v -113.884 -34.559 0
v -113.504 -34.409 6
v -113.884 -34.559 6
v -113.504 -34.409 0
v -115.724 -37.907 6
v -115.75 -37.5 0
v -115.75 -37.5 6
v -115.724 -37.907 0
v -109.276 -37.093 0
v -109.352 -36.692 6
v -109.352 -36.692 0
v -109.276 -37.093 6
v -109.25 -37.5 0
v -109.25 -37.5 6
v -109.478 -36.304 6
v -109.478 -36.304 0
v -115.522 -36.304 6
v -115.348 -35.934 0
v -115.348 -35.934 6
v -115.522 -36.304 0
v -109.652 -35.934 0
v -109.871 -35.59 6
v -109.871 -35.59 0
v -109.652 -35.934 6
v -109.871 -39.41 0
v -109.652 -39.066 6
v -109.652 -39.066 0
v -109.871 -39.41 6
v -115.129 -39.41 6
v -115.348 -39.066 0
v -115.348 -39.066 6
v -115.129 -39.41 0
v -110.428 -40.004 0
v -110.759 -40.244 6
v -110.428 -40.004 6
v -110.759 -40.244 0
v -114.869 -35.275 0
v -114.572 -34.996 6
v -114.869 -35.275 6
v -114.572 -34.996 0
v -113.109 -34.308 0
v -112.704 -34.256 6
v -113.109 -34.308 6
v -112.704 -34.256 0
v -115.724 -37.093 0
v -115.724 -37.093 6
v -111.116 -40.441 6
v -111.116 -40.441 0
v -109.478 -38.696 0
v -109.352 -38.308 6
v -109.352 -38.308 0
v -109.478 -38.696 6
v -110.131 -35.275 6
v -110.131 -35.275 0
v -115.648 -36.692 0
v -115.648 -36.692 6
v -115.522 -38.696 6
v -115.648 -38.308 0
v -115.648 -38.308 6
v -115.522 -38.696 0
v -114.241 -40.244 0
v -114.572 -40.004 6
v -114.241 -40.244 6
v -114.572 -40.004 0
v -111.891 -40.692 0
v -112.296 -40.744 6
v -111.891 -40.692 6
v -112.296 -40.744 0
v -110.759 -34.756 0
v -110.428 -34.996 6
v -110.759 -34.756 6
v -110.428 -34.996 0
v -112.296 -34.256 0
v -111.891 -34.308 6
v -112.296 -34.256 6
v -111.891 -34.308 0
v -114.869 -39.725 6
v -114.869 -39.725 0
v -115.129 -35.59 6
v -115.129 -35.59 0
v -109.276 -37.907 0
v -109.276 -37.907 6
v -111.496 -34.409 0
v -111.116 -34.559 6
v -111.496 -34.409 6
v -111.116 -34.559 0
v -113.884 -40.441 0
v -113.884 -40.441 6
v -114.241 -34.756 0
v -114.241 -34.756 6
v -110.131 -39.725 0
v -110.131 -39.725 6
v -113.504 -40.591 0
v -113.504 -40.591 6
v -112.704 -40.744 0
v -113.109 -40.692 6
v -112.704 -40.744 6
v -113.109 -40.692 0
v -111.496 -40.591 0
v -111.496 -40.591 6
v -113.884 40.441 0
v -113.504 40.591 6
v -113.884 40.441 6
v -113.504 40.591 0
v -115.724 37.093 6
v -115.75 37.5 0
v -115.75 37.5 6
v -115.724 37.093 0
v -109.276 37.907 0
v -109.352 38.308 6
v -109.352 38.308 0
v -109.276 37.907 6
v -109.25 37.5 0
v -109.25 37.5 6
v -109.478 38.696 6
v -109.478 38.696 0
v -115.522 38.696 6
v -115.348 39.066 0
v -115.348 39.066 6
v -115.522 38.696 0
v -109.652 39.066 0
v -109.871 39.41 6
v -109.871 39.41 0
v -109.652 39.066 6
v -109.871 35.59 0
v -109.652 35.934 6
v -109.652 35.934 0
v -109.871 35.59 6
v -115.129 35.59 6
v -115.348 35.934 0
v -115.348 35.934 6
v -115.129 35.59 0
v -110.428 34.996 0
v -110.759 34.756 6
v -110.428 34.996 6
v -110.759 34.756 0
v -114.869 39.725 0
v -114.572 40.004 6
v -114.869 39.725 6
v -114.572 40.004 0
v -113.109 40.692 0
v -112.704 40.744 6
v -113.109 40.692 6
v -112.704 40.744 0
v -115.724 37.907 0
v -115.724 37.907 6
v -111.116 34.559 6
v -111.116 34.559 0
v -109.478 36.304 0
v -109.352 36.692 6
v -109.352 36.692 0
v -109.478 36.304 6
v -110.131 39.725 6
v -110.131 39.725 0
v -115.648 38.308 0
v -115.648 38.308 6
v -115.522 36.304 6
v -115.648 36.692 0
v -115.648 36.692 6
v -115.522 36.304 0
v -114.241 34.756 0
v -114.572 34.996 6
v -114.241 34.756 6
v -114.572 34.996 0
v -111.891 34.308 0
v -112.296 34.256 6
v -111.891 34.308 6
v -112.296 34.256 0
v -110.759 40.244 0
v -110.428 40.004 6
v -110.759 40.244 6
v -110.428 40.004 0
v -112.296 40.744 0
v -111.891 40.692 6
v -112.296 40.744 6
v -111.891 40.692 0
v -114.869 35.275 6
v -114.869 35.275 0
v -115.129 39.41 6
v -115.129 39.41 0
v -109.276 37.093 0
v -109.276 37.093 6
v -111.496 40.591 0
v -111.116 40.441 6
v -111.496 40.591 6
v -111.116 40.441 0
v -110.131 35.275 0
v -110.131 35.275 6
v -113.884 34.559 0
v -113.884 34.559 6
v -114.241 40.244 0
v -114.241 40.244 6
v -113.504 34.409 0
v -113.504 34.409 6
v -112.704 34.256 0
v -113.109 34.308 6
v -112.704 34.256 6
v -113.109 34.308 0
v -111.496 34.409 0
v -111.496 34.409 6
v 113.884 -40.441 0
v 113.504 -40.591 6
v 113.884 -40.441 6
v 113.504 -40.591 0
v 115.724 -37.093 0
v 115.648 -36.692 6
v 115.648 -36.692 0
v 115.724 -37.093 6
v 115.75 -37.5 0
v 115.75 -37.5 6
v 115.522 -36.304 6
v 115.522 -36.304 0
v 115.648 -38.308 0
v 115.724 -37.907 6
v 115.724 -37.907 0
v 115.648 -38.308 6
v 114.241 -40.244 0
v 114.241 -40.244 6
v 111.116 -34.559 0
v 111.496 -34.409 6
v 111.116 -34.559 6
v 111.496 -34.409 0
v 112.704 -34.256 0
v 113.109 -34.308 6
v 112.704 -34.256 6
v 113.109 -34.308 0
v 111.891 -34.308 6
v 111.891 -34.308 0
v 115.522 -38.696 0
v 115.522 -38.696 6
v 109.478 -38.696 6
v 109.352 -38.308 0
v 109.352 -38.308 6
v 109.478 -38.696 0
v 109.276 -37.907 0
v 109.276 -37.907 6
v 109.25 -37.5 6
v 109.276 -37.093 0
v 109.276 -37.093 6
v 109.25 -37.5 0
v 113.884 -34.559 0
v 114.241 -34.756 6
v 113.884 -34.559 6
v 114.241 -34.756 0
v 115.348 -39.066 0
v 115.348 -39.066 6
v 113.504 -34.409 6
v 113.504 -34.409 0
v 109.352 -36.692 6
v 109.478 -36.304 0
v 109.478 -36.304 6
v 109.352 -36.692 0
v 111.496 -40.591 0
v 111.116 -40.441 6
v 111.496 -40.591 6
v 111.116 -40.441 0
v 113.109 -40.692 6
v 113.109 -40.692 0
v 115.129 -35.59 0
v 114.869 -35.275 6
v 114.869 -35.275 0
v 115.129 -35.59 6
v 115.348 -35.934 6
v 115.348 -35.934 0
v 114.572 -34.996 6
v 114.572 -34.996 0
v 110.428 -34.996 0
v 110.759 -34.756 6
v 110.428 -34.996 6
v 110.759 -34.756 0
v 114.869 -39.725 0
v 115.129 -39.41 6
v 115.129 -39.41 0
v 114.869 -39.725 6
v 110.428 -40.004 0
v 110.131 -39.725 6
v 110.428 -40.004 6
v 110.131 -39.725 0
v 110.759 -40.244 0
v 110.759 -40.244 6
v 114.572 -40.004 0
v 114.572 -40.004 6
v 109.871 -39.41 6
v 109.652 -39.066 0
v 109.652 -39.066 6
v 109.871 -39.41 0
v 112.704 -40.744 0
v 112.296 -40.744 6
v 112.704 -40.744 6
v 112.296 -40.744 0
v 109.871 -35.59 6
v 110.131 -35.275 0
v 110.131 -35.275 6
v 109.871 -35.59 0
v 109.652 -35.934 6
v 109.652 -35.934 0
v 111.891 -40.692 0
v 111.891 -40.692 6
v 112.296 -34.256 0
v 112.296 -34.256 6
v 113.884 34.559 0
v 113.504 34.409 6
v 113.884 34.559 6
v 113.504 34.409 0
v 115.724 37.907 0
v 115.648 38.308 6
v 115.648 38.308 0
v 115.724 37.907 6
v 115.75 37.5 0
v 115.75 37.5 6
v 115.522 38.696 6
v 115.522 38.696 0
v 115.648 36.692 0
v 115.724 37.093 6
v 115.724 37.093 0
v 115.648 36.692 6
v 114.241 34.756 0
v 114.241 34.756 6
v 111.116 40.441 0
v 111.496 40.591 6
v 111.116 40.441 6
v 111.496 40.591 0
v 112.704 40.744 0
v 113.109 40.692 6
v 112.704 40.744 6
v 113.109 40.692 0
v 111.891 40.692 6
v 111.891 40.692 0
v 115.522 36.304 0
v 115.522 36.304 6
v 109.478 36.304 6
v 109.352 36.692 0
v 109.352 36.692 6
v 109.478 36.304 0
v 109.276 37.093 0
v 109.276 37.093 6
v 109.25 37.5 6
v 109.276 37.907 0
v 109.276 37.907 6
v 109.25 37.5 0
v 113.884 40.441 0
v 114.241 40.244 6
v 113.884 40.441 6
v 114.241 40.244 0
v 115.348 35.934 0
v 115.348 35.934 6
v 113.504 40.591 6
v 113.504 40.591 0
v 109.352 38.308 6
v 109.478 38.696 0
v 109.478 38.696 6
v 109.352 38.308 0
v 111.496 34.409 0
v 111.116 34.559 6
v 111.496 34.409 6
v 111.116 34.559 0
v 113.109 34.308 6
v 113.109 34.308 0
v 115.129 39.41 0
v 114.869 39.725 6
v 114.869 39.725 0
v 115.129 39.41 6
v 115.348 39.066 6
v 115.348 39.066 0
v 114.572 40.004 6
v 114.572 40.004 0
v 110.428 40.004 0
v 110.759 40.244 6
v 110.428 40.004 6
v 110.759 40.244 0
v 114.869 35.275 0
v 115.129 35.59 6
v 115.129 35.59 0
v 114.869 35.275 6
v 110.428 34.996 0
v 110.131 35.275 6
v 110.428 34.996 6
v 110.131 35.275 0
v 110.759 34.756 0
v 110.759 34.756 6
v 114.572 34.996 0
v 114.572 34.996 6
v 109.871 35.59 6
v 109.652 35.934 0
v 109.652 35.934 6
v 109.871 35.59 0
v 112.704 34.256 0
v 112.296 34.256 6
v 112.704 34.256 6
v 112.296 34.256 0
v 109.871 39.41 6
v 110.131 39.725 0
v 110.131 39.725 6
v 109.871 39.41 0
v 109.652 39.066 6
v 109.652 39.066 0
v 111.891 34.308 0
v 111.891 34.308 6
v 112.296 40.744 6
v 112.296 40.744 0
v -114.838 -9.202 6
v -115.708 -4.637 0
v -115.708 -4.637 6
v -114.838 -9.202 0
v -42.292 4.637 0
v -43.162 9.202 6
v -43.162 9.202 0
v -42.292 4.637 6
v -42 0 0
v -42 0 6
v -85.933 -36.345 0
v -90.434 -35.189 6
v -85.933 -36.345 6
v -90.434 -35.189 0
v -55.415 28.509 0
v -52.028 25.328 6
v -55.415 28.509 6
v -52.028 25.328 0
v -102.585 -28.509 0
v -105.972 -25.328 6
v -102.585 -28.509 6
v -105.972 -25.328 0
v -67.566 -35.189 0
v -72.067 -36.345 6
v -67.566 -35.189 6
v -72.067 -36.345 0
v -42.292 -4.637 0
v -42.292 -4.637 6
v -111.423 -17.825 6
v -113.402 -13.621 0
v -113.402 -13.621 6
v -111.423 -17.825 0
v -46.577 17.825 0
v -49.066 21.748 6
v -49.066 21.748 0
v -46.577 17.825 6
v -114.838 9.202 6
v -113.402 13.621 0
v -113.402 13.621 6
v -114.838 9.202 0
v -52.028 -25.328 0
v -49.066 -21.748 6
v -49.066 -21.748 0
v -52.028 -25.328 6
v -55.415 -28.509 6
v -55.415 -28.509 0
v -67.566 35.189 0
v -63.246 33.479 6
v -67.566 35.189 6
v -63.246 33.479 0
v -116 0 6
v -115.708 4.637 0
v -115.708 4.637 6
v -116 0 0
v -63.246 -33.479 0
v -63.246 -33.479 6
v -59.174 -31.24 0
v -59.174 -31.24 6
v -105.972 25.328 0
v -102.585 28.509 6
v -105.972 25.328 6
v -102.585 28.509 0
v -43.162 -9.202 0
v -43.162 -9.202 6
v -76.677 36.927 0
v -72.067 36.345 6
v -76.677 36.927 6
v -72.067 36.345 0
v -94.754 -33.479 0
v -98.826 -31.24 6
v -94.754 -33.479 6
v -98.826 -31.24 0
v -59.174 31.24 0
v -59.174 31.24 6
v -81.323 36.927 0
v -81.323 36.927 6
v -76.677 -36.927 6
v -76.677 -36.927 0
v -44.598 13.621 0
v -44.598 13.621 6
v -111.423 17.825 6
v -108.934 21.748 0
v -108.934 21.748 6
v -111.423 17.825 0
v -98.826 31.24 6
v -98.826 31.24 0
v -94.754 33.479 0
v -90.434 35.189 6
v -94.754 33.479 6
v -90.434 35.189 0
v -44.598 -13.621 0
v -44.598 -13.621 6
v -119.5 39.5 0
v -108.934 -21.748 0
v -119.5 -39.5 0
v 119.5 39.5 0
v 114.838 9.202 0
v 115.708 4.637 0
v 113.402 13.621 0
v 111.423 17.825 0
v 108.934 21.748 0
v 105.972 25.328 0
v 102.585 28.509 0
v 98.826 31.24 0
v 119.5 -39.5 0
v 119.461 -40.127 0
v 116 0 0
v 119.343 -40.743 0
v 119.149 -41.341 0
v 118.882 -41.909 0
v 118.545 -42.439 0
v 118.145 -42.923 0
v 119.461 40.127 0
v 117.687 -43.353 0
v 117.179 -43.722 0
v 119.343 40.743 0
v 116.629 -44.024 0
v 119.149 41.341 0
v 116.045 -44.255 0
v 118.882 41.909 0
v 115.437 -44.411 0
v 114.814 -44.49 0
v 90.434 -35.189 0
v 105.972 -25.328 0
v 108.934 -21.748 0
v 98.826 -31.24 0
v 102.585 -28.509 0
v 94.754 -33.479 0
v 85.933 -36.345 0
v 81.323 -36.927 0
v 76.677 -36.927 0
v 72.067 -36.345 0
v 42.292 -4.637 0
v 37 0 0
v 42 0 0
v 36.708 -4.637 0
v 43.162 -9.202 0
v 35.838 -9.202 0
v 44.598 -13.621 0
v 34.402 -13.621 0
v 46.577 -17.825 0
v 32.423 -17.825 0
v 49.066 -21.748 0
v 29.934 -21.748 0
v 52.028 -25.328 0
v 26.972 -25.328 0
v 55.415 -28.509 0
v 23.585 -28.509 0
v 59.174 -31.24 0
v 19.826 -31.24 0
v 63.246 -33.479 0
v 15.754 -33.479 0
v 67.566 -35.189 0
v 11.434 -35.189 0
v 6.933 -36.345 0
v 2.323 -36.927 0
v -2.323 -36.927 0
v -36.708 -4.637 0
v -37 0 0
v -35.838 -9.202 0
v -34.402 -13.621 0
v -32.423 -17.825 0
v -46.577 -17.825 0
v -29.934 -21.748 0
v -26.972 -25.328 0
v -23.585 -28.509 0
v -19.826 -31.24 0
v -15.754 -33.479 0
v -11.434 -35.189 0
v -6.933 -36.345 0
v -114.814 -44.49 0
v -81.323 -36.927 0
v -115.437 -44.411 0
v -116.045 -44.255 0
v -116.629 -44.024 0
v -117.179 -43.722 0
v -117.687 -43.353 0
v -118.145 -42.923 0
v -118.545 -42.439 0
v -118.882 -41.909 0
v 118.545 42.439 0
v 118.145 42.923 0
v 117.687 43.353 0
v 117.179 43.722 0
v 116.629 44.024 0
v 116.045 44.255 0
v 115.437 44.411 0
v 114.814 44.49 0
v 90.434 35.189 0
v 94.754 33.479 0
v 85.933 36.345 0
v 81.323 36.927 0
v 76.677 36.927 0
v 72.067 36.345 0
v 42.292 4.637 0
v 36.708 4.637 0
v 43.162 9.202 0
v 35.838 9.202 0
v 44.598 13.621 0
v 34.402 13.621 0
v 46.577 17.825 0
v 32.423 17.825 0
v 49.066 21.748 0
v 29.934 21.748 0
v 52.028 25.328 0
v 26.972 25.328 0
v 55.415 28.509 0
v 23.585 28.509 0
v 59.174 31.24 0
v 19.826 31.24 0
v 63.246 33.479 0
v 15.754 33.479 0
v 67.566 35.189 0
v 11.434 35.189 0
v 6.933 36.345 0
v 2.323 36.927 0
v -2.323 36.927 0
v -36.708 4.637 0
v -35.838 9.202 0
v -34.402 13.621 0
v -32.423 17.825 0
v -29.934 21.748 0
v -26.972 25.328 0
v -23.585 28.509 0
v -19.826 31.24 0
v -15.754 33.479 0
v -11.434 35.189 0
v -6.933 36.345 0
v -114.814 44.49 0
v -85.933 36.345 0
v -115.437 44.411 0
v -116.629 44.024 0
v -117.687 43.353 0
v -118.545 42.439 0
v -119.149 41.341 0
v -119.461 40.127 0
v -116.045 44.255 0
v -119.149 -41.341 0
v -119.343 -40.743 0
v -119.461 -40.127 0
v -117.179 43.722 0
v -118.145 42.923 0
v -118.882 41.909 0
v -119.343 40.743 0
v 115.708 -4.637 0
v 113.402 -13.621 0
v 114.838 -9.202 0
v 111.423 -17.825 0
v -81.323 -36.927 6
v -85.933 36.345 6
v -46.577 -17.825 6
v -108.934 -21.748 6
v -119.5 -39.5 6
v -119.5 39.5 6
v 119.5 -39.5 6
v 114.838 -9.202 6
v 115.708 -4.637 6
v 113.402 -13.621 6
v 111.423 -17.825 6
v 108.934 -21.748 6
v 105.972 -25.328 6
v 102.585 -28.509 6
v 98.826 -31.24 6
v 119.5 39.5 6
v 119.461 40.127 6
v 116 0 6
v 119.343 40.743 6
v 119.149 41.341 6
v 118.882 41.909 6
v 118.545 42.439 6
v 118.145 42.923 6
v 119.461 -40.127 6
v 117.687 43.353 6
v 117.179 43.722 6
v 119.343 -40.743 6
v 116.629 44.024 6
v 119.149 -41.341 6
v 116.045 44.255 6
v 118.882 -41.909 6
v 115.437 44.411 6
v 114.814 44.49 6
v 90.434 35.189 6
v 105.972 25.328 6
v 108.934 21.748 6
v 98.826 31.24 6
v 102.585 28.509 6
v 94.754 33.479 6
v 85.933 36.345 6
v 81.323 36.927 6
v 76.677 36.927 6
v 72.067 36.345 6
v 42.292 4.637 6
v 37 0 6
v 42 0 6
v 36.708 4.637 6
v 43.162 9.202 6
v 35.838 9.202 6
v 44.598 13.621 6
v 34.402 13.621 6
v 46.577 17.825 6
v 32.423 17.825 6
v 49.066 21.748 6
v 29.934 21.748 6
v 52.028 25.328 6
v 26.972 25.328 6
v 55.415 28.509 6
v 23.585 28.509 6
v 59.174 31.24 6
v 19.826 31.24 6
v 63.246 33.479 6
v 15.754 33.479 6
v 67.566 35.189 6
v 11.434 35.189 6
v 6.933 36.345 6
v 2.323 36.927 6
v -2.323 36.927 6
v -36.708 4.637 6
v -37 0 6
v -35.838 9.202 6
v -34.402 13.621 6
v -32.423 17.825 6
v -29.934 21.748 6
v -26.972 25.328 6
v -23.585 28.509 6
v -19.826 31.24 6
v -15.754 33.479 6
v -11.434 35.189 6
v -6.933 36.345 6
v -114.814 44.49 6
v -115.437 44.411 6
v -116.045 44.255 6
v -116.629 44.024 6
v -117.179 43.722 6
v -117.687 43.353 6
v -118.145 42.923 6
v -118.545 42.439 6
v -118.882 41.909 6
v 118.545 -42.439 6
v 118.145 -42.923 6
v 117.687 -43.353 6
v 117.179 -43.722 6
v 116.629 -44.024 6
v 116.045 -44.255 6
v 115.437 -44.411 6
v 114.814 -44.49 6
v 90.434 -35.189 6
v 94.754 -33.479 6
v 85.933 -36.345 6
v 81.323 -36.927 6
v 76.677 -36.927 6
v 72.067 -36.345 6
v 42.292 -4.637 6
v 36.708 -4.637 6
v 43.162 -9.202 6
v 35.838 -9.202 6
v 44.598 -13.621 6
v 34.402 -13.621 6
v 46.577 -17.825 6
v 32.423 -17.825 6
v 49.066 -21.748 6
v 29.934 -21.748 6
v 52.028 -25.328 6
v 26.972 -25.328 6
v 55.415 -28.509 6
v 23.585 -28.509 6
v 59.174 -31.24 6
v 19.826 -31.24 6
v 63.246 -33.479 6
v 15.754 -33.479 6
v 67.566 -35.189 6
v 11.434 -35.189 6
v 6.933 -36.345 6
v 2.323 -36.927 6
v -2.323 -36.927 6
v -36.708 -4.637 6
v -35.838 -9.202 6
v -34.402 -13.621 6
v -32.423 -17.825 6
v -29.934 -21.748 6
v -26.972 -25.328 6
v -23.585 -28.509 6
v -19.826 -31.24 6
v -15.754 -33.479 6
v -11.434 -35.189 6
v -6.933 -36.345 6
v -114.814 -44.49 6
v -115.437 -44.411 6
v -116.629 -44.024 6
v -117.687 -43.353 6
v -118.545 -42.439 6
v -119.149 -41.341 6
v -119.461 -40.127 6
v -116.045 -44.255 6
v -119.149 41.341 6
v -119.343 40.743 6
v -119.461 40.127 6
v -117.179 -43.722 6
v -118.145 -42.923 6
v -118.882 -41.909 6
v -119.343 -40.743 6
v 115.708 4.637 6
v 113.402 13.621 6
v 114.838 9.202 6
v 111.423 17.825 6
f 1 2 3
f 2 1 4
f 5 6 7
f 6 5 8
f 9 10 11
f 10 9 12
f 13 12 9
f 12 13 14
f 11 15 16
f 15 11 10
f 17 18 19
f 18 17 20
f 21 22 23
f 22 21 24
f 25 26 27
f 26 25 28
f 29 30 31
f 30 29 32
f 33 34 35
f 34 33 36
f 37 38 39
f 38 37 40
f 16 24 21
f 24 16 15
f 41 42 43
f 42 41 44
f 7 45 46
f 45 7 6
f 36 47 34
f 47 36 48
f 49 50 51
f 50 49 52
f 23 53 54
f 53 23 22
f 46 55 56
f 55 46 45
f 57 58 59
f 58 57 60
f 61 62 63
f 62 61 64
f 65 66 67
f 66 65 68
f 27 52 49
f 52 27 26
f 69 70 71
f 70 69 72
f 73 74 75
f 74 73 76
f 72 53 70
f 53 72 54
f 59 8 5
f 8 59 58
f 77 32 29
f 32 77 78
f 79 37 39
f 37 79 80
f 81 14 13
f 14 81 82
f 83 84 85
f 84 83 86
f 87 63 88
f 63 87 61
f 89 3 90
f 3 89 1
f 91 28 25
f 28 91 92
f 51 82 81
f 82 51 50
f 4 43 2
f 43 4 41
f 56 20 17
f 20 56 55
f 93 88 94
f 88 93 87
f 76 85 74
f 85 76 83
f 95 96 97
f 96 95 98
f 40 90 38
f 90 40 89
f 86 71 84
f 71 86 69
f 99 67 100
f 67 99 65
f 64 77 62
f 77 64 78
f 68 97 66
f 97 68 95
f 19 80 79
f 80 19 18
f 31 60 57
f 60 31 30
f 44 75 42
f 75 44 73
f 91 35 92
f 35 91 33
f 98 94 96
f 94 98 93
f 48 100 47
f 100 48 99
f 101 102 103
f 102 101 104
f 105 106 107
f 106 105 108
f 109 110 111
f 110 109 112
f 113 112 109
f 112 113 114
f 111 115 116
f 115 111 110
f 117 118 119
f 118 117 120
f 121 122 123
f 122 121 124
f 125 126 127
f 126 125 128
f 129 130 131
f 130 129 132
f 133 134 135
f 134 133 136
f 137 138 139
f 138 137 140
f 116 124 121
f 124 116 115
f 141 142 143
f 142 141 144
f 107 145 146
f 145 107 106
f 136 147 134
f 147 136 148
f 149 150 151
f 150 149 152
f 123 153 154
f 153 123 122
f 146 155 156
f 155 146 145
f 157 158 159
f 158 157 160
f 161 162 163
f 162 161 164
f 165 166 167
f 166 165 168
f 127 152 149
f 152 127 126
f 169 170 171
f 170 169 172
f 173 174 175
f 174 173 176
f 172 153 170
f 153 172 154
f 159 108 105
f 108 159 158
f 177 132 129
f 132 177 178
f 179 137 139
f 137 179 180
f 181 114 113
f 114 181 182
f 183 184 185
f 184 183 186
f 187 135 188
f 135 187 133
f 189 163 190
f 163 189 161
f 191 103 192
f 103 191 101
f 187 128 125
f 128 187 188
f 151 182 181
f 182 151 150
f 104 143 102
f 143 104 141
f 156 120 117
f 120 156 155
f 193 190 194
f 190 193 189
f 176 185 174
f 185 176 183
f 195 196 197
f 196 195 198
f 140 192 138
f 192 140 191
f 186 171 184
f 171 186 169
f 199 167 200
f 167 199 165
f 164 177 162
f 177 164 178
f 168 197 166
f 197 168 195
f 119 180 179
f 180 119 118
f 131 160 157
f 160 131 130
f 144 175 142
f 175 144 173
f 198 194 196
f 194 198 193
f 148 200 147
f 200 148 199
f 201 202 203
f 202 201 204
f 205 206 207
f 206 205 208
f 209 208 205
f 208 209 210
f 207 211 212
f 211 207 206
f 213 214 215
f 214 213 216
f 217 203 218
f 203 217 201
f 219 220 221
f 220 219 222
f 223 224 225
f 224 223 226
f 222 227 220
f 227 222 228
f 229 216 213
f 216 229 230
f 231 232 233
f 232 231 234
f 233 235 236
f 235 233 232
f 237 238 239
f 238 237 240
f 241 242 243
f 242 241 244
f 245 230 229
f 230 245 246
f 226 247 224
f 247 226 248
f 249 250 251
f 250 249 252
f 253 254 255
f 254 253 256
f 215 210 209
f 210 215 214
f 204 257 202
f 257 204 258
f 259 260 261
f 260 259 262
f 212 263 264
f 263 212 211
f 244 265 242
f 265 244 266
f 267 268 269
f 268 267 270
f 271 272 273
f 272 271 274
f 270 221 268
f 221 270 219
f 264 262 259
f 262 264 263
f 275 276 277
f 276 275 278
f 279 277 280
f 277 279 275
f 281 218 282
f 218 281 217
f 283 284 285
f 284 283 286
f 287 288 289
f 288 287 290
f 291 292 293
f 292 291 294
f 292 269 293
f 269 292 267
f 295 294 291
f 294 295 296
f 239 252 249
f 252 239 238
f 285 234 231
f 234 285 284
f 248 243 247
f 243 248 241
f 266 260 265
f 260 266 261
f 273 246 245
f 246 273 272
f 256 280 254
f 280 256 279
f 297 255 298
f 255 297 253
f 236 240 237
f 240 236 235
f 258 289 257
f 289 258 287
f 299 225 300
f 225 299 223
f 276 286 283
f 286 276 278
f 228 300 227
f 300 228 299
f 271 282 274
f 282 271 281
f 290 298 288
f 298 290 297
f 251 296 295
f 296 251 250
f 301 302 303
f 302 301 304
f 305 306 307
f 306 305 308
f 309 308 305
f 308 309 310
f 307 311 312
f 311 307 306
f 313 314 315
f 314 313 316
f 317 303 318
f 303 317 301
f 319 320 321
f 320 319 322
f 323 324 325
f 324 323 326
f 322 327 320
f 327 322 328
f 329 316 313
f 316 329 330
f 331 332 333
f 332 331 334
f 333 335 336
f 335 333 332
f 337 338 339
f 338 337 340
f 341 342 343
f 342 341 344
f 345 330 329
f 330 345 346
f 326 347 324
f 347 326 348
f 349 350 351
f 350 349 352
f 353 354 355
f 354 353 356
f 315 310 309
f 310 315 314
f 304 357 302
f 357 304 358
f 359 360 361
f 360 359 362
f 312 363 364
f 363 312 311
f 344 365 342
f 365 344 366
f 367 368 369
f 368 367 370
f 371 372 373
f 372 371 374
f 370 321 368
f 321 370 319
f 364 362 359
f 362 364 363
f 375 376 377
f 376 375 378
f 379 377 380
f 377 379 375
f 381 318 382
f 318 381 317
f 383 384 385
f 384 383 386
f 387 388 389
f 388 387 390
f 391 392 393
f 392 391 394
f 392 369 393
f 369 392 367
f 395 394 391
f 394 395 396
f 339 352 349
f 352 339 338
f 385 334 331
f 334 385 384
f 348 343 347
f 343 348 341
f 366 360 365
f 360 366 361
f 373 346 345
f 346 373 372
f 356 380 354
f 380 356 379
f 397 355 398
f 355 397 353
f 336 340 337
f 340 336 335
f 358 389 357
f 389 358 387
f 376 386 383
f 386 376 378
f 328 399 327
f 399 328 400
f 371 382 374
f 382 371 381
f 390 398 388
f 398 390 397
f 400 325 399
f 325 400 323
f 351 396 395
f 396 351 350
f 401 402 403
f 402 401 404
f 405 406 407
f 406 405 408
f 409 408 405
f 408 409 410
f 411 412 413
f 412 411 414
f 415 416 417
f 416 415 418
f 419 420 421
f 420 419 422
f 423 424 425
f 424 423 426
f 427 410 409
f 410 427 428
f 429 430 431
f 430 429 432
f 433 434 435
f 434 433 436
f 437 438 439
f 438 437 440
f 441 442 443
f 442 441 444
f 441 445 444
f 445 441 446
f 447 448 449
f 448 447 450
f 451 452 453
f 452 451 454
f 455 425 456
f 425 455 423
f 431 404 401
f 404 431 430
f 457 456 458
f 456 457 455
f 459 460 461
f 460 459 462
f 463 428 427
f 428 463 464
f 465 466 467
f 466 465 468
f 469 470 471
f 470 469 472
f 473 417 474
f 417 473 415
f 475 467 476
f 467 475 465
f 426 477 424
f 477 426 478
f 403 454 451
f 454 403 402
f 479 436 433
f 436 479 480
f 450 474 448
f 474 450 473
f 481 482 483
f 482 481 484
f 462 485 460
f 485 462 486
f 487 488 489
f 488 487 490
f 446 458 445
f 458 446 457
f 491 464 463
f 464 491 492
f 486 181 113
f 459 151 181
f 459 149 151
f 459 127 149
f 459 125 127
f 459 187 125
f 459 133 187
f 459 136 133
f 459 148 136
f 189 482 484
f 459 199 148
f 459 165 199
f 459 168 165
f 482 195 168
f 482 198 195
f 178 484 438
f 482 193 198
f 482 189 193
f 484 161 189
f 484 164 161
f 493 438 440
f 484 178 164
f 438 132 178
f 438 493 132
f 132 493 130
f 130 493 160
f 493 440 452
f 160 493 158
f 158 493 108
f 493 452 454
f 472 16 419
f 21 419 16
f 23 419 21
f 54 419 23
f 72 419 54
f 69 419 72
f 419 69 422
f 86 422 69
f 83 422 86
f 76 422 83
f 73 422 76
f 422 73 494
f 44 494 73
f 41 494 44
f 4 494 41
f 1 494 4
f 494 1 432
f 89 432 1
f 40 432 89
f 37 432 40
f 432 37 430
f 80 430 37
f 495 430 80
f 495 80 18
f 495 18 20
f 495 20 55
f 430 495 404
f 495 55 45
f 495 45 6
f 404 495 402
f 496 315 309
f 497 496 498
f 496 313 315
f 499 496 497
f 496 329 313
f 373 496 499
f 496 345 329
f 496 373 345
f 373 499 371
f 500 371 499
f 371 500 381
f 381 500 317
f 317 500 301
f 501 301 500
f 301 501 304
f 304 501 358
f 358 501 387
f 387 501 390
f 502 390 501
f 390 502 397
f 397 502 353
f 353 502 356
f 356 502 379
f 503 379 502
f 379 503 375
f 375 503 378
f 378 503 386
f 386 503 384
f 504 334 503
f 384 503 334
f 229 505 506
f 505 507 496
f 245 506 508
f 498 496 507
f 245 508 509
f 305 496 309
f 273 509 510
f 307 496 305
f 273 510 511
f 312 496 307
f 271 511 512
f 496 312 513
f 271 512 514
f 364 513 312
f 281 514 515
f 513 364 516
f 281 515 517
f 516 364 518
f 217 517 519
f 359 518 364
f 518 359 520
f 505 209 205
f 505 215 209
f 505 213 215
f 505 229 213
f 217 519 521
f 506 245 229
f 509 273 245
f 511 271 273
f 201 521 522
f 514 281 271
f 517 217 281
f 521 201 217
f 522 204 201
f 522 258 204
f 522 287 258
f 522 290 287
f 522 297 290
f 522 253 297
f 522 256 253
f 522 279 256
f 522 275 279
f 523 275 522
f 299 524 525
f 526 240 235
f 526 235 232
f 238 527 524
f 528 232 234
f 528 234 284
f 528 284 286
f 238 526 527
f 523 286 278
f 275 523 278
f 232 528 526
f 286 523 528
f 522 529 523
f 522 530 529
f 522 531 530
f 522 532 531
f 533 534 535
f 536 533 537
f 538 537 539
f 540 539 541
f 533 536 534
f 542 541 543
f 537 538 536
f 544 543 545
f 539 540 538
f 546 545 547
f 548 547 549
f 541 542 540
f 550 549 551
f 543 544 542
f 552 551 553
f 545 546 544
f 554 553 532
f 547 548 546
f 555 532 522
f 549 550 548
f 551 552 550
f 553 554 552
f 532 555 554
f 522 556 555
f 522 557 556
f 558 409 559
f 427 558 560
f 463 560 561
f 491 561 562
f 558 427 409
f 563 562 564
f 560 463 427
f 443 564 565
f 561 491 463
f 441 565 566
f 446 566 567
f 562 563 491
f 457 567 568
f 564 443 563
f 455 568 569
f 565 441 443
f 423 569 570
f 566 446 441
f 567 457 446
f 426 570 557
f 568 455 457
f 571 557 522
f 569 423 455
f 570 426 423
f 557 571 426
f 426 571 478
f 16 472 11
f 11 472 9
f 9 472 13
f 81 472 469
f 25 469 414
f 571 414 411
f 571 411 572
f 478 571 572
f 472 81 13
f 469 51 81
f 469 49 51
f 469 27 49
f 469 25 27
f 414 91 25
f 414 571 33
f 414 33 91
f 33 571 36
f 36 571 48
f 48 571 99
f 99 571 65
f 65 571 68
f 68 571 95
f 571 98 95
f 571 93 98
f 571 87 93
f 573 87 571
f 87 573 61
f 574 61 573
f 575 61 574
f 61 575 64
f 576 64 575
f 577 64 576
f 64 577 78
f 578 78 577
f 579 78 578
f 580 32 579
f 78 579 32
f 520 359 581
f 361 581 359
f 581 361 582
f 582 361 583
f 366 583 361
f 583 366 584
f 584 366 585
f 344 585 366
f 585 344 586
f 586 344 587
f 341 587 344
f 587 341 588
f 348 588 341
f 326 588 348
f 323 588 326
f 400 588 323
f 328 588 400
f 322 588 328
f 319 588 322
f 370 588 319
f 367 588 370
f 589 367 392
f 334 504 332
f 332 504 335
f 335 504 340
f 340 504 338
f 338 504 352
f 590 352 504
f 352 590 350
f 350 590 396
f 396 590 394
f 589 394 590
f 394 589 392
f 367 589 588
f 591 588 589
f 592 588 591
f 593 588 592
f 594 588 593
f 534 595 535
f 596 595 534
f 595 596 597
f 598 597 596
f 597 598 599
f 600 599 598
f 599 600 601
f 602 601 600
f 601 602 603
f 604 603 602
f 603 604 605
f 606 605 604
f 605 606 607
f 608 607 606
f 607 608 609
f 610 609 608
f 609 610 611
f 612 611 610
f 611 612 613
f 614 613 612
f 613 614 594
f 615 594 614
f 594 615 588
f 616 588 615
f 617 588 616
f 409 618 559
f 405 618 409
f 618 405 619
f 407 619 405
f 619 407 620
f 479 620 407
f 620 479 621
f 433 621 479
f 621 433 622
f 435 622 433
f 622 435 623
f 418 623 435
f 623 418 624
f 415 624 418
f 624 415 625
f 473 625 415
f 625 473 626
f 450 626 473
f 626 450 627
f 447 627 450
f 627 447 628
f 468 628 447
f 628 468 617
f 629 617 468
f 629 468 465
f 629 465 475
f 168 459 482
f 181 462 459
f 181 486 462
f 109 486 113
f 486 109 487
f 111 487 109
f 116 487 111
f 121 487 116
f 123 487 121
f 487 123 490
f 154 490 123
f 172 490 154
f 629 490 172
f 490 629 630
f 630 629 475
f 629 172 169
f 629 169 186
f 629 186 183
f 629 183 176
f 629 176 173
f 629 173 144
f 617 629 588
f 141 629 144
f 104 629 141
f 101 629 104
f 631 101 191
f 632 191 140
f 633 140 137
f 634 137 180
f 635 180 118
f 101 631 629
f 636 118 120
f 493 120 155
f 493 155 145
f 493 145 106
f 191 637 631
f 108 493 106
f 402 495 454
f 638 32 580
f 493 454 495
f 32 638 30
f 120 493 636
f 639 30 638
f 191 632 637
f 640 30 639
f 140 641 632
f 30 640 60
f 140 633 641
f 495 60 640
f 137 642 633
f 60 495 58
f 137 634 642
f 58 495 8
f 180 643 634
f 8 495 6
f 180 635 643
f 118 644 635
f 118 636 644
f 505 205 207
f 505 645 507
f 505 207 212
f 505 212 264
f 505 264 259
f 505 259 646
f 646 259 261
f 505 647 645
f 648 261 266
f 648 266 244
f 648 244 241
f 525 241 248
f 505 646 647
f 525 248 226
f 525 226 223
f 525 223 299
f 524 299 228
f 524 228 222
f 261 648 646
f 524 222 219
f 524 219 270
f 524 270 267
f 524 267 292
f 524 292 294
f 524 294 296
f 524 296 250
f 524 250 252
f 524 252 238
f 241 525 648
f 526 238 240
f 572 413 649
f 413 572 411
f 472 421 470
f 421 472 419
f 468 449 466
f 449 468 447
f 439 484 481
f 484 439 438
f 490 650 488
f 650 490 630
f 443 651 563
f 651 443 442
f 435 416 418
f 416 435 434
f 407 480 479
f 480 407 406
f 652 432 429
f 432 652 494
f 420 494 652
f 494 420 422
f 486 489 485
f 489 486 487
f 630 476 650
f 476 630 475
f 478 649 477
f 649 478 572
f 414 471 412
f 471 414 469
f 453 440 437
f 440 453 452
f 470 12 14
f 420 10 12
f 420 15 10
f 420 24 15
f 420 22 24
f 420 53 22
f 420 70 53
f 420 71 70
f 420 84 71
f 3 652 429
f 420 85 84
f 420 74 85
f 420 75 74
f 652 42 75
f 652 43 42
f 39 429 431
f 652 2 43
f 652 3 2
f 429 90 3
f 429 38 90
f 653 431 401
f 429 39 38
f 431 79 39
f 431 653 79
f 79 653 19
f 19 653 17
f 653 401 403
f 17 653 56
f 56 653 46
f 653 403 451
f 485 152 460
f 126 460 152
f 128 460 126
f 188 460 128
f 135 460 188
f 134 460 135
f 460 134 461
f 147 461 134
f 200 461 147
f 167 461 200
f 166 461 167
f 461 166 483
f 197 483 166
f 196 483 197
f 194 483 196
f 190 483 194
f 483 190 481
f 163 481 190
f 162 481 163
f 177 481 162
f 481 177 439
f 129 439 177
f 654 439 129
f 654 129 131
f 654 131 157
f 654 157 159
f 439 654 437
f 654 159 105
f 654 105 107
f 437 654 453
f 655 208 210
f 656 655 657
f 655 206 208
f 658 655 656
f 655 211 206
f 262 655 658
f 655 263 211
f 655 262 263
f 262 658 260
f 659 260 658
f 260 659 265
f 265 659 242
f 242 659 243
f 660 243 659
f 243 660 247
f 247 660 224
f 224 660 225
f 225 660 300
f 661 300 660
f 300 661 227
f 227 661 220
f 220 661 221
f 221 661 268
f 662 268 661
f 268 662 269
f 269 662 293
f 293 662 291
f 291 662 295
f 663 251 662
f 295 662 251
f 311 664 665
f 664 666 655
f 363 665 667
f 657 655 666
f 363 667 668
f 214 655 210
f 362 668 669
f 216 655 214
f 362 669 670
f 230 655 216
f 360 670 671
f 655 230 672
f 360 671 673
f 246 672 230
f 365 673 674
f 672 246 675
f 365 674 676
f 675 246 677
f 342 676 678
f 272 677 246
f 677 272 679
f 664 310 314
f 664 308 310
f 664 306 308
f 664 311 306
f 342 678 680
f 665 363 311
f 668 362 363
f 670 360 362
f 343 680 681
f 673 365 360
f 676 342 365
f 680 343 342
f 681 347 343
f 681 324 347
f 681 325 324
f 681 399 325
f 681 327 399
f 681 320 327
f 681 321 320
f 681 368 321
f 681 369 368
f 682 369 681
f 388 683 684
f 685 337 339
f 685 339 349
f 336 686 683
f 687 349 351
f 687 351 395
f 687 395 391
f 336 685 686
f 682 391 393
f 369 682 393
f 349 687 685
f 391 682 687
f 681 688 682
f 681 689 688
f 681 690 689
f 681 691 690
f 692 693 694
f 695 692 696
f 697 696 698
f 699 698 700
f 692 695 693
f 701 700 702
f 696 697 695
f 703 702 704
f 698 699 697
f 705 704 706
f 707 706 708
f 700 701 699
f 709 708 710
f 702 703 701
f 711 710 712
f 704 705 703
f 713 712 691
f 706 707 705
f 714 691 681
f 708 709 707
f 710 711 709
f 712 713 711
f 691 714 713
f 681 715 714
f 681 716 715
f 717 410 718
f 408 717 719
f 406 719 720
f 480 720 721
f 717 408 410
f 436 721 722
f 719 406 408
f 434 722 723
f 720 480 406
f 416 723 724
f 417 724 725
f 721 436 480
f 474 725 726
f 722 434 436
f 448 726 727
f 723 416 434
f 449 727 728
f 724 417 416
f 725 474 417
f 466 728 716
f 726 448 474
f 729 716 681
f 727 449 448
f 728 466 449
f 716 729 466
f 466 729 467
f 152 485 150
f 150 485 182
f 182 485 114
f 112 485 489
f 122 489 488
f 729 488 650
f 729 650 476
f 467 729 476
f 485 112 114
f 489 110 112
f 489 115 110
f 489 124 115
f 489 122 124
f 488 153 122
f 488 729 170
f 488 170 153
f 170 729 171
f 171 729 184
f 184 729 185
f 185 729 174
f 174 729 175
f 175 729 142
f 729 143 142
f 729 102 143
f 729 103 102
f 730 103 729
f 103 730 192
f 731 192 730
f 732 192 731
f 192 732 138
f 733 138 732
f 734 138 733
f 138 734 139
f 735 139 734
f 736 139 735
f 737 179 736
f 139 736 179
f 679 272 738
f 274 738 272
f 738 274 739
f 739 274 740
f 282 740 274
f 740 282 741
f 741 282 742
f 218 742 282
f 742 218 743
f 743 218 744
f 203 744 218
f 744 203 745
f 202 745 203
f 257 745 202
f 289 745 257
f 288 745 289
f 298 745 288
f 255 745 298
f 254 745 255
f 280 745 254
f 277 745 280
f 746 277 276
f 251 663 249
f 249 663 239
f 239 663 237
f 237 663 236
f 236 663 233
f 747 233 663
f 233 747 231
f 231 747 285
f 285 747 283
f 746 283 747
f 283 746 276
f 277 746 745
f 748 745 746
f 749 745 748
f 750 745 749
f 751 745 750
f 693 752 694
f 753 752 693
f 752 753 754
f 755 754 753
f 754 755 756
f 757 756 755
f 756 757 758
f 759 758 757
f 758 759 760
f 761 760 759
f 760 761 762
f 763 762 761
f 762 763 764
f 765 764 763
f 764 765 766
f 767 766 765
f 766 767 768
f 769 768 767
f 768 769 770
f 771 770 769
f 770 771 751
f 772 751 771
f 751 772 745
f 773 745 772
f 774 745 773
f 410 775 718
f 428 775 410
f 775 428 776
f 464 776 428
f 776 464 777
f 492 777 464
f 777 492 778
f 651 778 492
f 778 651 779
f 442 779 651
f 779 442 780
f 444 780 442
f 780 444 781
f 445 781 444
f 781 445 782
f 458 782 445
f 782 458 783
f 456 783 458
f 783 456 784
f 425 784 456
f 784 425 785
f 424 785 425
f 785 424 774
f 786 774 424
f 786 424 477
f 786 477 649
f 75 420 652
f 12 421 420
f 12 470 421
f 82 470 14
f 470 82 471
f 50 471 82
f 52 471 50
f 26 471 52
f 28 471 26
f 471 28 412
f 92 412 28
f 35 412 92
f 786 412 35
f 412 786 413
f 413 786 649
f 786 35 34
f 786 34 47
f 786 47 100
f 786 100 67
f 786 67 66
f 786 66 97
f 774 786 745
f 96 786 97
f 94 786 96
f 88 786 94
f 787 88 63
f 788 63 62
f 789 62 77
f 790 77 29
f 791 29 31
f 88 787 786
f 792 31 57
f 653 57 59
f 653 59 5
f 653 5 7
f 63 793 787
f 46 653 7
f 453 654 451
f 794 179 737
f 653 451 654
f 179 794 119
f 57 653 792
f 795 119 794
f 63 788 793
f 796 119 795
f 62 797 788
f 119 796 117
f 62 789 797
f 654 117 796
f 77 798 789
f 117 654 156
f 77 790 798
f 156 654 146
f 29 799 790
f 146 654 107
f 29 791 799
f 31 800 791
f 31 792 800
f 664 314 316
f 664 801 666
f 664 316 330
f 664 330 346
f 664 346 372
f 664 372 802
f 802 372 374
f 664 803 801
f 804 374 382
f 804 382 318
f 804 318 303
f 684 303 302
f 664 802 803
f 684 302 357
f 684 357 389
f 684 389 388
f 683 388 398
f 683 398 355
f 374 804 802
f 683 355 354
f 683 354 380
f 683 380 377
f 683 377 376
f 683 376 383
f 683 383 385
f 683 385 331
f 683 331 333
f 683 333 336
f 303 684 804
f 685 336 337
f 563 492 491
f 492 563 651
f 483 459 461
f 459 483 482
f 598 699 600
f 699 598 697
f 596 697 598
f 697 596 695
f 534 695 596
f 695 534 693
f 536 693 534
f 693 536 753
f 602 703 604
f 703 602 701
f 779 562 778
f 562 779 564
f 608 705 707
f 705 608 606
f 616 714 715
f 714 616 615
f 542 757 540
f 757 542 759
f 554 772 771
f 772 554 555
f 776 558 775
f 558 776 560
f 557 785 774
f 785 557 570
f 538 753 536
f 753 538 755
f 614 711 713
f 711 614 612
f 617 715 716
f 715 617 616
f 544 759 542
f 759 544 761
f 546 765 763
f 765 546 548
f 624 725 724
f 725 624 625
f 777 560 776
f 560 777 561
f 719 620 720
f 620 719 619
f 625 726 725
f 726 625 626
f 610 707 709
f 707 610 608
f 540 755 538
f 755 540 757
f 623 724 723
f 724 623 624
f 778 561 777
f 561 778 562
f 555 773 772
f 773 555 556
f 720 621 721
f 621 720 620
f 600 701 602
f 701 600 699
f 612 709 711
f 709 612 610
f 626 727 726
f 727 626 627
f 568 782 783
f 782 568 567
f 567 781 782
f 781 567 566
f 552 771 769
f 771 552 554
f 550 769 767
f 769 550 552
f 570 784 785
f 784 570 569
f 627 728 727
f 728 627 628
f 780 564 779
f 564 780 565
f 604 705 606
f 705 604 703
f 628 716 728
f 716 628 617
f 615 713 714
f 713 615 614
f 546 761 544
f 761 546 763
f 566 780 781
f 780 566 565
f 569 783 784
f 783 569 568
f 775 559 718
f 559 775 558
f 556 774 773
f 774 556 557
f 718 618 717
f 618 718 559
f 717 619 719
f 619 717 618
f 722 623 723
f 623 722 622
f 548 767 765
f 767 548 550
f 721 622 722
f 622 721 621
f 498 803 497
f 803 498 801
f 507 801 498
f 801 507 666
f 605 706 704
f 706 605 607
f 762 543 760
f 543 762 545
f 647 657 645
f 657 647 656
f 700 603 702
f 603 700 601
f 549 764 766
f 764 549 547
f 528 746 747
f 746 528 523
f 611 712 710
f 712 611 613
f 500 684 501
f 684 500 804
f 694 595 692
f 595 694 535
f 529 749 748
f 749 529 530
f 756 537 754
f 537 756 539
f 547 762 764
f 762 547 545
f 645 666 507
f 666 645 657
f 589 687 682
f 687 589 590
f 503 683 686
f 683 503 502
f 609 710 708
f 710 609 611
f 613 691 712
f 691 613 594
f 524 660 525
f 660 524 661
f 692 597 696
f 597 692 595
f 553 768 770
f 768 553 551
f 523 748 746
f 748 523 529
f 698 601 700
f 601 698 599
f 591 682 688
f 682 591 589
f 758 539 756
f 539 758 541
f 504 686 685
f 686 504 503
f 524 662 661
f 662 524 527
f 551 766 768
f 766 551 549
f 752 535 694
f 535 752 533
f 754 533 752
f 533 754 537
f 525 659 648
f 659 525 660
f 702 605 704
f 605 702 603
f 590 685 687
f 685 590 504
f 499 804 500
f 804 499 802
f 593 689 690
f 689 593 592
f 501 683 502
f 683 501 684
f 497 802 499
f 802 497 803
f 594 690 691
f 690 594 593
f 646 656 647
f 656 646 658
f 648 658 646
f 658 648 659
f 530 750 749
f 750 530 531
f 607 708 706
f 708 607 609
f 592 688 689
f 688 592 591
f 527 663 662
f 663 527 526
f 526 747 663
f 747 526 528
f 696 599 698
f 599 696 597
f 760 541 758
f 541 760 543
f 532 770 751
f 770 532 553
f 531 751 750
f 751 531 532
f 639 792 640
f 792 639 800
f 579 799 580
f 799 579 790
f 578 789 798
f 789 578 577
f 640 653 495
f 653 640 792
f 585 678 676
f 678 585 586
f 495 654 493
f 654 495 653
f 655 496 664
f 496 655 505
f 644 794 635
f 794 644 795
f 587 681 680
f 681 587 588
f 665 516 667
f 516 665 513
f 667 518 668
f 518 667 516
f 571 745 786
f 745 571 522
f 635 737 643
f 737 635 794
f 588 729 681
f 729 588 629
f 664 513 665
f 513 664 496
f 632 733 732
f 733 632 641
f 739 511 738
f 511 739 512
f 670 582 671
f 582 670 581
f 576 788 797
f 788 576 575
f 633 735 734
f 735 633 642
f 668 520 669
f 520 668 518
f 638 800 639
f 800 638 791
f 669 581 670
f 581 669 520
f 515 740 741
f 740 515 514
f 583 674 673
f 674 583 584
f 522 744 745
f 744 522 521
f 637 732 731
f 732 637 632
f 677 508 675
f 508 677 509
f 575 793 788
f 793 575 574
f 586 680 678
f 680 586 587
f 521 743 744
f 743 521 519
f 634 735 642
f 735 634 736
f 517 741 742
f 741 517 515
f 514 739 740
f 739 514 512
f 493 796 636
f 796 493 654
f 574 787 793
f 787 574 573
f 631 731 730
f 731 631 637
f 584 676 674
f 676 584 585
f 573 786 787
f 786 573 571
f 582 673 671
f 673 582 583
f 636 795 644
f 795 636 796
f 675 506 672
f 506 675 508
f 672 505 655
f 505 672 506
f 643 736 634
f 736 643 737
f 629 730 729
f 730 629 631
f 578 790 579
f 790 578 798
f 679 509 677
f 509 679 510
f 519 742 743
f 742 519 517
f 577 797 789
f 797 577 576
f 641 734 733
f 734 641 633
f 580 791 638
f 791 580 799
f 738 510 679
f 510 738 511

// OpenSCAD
$fn = 50;


difference() {
	union() {
		hull() {
			translate(v = [-114.5000000000, 39.5000000000, 0]) {
				cylinder(h = 6, r = 5);
			}
			translate(v = [114.5000000000, 39.5000000000, 0]) {
				cylinder(h = 6, r = 5);
			}
			translate(v = [-114.5000000000, -39.5000000000, 0]) {
				cylinder(h = 6, r = 5);
			}
			translate(v = [114.5000000000, -39.5000000000, 0]) {
				cylinder(h = 6, r = 5);
			}
		}
	}
	union() {
		#translate(v = [-112.5000000000, -37.5000000000, -100.0000000000]) {
			cylinder(h = 200, r = 3.2500000000);
		}
		#translate(v = [-112.5000000000, 37.5000000000, -100.0000000000]) {
			cylinder(h = 200, r = 3.2500000000);
		}
		#translate(v = [112.5000000000, -37.5000000000, -100.0000000000]) {
			cylinder(h = 200, r = 3.2500000000);
		}
		#translate(v = [112.5000000000, 37.5000000000, -100.0000000000]) {
			cylinder(h = 200, r = 3.2500000000);
		}
		#translate(v = [-79.0000000000, 0, 0]) {
			cylinder(h = 6, r = 37.0000000000);
		}
		#cylinder(h = 6, r = 37.0000000000);
		#translate(v = [79.0000000000, 0, 0]) {
			cylinder(h = 6, r = 37.0000000000);
		}
	}
}
